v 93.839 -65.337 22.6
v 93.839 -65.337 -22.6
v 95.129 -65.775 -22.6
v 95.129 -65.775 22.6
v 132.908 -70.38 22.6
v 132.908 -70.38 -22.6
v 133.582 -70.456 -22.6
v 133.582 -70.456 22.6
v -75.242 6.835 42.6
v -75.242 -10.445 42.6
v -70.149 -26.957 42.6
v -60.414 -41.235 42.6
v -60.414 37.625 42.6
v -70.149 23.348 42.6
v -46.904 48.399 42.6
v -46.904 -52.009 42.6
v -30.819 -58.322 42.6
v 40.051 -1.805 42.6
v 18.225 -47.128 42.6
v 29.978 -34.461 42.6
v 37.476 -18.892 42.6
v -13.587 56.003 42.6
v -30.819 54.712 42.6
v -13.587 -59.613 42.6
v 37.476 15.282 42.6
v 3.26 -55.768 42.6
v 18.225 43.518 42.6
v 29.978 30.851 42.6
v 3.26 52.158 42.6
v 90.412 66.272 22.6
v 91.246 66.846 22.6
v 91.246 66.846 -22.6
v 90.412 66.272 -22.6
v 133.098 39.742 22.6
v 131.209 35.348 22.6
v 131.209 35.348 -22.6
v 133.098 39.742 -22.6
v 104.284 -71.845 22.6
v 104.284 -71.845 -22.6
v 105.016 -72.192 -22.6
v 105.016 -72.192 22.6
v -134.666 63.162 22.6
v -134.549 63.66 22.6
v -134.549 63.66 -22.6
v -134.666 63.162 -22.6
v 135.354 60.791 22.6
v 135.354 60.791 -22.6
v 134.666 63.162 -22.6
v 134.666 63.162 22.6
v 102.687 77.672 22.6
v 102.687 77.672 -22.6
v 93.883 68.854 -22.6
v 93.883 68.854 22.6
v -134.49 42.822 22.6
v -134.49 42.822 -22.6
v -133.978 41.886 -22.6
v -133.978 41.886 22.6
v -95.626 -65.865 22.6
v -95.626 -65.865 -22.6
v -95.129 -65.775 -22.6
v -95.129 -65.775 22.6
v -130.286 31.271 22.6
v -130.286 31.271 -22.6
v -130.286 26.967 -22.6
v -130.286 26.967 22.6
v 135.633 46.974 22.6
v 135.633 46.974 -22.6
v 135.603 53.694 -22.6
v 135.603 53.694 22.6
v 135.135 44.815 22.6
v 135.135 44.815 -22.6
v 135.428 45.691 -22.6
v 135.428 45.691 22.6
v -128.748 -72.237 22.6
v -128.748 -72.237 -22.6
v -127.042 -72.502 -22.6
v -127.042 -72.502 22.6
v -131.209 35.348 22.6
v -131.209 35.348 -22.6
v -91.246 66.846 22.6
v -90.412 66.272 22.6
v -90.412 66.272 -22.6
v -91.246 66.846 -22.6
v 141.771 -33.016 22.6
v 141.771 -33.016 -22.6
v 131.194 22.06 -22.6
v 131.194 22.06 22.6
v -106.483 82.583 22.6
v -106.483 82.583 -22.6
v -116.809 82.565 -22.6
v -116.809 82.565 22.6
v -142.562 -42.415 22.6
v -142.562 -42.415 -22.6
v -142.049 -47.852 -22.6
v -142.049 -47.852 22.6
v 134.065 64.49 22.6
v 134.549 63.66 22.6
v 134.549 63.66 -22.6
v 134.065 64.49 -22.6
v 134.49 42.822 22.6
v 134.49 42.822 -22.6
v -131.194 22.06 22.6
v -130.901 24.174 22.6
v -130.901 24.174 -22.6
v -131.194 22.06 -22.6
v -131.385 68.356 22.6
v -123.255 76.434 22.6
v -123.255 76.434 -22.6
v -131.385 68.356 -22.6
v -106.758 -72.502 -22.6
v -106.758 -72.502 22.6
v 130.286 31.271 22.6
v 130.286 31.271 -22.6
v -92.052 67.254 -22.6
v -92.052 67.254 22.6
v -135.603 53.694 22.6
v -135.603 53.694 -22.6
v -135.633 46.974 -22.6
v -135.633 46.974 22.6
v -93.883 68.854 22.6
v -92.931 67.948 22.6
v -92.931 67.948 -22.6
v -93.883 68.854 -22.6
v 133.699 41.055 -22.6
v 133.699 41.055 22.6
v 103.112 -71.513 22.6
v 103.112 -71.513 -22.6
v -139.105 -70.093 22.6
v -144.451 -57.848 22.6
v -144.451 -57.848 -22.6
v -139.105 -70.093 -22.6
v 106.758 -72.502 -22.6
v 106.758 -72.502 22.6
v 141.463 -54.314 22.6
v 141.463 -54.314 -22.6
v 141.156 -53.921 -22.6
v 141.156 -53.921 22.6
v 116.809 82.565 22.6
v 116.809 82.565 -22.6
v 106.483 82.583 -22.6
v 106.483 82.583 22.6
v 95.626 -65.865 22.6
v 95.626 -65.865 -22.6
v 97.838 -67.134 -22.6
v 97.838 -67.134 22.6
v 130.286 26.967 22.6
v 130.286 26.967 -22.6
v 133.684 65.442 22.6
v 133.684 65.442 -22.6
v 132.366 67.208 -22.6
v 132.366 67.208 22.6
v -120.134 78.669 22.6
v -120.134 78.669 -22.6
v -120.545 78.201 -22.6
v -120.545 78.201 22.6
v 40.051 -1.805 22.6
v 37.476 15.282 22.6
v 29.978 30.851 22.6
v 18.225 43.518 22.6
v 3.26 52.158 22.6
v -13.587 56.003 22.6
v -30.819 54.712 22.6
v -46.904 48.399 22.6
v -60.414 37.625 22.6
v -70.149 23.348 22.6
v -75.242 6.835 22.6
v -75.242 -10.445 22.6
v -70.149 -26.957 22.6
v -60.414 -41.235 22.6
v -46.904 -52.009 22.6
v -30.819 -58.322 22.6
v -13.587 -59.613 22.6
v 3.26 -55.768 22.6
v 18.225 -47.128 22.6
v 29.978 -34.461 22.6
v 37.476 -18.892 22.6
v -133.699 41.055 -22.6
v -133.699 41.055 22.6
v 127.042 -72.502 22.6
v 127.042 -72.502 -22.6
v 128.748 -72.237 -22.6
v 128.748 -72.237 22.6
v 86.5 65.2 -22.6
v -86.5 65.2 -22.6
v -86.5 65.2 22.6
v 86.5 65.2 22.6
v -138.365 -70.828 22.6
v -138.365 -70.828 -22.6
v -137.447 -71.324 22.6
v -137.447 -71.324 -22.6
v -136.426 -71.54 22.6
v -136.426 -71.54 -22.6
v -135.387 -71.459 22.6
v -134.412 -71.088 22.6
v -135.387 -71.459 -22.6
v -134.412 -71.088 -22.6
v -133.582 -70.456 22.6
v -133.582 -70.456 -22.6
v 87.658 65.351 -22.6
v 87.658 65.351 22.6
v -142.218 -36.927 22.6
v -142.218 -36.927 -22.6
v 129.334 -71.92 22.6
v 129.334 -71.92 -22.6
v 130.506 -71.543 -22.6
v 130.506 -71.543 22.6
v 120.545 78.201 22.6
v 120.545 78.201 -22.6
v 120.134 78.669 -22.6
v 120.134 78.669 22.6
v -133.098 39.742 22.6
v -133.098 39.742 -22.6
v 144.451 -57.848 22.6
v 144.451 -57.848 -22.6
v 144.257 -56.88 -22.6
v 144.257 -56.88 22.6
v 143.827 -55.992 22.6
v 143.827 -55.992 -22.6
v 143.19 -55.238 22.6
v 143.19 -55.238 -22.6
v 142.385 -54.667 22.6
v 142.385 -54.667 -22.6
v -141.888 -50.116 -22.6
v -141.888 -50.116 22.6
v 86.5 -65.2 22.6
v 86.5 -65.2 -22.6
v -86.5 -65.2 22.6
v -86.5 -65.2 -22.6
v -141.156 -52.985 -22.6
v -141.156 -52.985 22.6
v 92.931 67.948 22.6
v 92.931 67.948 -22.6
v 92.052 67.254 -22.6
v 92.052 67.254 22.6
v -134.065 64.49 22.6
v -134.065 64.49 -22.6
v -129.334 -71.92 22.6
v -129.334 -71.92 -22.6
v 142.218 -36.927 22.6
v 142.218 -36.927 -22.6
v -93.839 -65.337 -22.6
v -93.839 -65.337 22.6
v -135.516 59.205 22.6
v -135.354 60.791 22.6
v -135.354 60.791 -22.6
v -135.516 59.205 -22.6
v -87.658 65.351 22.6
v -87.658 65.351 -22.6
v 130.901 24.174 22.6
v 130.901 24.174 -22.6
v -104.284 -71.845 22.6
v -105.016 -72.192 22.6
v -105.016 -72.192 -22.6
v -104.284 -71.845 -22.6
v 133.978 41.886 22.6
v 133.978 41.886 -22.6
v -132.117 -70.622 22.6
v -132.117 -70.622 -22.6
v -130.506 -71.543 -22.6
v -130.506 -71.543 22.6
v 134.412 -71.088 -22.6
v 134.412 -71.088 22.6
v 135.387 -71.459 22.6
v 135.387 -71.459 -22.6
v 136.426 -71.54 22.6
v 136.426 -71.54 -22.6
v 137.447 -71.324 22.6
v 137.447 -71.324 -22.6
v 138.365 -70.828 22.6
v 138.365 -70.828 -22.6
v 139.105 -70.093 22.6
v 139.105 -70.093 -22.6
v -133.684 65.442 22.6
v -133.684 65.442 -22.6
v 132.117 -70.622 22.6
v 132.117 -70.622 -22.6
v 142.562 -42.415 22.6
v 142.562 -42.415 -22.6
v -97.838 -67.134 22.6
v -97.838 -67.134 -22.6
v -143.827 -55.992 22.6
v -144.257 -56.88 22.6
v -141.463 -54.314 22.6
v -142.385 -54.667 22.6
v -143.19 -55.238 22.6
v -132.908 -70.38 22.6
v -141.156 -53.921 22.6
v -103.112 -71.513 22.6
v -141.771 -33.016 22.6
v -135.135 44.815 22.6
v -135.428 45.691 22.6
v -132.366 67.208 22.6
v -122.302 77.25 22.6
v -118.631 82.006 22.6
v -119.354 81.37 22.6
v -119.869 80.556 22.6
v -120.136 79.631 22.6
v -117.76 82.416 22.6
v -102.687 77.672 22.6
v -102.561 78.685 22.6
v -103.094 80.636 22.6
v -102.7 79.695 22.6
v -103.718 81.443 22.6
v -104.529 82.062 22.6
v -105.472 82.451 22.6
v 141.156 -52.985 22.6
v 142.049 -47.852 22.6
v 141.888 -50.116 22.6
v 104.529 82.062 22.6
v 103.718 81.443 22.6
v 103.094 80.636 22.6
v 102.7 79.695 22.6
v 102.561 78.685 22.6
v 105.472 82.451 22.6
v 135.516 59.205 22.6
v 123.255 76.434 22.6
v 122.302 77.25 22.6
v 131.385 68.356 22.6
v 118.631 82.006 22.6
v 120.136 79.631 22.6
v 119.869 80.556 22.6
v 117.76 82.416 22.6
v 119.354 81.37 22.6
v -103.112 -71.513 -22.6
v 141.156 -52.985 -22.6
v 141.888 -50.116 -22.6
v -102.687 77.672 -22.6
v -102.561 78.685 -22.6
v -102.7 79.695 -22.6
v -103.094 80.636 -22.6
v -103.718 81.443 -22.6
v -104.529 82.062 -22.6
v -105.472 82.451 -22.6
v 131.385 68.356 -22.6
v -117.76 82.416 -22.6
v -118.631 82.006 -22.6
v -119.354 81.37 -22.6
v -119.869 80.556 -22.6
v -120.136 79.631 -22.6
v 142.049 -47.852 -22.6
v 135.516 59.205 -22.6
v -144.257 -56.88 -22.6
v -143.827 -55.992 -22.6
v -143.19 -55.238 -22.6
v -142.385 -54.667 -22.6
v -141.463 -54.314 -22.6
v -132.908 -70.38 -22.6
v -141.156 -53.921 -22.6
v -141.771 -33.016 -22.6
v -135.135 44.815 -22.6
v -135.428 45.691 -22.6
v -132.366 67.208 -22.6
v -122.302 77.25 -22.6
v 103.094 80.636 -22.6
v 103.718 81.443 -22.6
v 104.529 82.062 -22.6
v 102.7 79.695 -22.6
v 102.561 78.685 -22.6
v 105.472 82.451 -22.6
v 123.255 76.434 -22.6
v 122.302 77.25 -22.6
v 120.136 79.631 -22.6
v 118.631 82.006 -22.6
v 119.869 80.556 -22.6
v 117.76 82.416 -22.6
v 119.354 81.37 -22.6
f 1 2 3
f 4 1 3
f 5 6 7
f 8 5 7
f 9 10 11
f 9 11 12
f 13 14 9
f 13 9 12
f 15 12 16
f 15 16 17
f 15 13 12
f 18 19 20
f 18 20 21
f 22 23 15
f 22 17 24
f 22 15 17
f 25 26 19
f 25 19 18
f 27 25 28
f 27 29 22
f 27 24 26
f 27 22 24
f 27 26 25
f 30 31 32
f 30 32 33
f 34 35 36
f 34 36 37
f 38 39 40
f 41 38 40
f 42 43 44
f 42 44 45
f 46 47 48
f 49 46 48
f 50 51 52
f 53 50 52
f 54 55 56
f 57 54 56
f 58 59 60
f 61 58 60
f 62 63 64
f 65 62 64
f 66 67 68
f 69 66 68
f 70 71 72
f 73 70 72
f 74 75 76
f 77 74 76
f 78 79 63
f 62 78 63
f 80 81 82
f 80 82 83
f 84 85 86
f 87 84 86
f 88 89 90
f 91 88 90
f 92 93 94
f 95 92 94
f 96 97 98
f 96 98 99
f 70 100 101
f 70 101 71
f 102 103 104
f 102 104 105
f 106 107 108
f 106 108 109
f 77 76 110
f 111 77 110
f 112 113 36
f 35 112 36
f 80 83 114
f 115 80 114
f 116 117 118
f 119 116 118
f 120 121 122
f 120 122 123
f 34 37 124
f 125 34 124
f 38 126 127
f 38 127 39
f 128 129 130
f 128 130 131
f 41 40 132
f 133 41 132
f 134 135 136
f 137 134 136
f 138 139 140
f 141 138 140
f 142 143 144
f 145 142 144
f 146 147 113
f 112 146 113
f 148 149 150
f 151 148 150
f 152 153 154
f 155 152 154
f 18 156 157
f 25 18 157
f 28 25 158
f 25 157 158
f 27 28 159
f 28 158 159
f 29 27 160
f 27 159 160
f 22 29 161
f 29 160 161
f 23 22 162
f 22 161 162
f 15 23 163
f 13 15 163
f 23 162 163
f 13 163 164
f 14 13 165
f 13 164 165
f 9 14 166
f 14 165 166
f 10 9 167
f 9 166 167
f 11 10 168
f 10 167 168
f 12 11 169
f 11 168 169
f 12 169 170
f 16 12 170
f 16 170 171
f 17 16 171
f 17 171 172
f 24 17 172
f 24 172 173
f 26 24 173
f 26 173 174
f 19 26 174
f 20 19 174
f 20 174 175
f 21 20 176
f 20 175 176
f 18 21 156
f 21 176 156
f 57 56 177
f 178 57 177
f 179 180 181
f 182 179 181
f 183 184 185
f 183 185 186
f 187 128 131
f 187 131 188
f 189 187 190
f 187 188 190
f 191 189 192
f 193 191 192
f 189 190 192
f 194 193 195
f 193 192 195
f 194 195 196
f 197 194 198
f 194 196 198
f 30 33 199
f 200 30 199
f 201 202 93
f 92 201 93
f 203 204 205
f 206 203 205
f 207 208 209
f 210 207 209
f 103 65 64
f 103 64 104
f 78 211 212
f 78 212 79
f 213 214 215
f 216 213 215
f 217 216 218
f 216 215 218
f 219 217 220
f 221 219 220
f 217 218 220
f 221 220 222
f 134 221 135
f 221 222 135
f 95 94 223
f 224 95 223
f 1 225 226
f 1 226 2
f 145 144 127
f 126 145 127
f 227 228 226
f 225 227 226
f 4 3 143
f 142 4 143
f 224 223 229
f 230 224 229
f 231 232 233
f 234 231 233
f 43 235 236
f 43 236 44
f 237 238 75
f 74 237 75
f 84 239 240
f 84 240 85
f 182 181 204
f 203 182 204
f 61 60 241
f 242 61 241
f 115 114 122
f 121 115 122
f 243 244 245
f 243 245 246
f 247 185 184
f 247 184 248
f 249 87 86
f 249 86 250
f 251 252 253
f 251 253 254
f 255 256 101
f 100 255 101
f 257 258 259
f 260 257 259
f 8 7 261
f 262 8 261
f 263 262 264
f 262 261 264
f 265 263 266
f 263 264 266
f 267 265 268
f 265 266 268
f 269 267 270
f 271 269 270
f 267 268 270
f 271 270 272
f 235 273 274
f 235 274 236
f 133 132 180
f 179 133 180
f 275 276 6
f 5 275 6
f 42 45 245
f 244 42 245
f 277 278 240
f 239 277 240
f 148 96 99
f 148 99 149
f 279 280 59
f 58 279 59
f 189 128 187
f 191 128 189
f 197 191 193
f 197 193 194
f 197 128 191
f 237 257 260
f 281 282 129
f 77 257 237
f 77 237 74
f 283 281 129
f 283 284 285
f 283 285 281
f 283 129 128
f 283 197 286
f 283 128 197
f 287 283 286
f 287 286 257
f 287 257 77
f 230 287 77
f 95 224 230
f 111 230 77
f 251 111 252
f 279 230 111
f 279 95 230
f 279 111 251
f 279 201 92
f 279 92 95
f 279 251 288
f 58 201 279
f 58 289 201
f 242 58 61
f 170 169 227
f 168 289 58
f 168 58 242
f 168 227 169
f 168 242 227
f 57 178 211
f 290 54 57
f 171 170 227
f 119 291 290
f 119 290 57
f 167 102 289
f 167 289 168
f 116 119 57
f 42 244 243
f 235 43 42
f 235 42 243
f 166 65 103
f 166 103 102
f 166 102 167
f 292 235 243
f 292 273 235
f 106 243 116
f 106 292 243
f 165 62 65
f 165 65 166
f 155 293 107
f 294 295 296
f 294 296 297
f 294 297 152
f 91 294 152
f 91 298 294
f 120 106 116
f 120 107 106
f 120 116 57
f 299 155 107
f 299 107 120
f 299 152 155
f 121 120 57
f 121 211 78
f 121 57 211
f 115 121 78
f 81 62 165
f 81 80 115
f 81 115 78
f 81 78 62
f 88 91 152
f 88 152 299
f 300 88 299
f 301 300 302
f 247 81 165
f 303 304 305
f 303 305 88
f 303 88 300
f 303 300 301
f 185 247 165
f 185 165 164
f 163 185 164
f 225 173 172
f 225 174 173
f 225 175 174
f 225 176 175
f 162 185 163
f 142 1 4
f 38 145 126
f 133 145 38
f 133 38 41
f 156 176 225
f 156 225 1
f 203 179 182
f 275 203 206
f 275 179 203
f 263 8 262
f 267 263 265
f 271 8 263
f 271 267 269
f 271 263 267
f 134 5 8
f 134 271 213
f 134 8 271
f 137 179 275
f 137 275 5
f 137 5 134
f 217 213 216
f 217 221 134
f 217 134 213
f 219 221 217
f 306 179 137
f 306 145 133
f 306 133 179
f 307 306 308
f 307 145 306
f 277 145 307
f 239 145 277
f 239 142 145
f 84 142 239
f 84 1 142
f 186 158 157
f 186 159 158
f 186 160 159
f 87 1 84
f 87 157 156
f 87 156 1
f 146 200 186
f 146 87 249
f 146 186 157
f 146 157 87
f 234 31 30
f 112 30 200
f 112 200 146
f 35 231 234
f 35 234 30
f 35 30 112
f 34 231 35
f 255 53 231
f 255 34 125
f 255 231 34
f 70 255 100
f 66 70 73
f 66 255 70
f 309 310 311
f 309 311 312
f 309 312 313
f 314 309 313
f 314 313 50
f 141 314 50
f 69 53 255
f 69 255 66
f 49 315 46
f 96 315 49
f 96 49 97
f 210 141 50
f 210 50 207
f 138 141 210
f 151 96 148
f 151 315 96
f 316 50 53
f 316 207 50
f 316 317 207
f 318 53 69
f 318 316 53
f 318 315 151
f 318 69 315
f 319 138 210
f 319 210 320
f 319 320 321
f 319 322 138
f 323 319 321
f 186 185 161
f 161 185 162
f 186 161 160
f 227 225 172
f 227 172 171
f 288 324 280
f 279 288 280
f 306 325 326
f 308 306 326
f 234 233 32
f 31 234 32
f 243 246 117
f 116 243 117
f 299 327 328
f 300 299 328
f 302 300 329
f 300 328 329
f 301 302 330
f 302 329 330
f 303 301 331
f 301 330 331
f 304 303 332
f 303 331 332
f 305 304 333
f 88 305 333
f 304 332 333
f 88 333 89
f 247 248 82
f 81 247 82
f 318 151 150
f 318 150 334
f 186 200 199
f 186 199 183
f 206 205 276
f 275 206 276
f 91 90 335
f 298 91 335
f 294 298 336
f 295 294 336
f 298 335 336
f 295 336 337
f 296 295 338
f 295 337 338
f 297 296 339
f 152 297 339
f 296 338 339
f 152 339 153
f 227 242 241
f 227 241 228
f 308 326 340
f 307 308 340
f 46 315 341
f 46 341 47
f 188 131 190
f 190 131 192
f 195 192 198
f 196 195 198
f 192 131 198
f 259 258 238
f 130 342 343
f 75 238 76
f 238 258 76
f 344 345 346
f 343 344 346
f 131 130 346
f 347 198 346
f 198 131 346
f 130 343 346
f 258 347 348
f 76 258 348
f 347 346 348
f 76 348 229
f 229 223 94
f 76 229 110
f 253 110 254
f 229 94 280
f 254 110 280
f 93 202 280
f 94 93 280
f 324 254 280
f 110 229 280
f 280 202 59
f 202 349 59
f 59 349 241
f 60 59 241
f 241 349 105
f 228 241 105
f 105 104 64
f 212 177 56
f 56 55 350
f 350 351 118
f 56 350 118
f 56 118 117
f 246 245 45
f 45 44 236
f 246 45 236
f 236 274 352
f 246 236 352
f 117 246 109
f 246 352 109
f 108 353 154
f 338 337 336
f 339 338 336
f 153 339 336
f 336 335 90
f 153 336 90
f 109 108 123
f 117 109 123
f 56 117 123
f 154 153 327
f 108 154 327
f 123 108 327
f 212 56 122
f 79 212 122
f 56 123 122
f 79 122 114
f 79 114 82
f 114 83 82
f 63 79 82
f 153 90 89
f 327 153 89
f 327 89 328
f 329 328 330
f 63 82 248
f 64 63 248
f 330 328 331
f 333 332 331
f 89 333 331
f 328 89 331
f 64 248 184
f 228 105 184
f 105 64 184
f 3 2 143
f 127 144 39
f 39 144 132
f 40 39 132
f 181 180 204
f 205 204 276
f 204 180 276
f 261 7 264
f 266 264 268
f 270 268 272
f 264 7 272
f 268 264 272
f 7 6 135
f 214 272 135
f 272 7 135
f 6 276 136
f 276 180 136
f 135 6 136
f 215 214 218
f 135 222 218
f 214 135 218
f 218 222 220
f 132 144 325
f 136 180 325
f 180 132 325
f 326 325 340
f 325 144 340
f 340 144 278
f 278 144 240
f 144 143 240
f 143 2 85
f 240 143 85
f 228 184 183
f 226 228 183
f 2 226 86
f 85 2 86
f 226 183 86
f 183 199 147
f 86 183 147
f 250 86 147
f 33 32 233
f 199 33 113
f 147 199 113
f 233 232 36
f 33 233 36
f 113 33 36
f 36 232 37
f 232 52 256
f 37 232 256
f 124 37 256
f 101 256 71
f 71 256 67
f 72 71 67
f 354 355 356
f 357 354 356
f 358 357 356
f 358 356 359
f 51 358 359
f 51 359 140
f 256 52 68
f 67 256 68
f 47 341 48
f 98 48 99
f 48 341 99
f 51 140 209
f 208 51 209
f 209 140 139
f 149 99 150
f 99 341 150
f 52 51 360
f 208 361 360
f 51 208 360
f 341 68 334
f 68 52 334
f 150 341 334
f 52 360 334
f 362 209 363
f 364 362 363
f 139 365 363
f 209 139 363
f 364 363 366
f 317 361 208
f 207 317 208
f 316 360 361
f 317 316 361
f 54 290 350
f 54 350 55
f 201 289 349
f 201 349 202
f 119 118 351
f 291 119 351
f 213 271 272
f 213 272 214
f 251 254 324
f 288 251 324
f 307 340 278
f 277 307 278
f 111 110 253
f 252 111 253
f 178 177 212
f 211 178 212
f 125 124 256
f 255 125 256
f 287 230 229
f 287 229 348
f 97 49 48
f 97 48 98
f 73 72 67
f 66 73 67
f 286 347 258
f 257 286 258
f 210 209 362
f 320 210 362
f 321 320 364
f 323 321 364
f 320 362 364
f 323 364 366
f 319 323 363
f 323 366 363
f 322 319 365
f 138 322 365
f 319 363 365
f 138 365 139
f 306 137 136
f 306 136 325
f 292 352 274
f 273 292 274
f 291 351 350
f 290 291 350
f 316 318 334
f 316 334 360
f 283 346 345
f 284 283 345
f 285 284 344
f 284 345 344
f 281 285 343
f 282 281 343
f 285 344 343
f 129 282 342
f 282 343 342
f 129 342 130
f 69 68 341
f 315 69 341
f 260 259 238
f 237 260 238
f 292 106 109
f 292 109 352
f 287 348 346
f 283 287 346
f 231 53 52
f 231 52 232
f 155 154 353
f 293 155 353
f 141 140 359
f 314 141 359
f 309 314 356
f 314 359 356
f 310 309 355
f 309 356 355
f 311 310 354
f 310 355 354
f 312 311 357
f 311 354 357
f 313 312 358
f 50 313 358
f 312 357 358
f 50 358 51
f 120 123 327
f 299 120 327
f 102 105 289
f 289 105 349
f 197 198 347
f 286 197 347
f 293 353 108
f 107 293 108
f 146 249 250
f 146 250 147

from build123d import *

# Parameters (mm, degrees)
ESBO_O2_W                = 173
ESBO_O2_H                = 45.2
RESSALTO_EXTRUS_O2_DEPTH = 65.2
ESBO_O3_R                = 57.970457698
RESSALTO_EXTRUS_O3_DEPTH = 20
RESSALTO_EXTRUS_O4_START = -45.2
RESSALTO_EXTRUS_O4_DEPTH = 45.2


# Read off the part's stored shape, not the designer's step: Ressalto-extrusão4
with BuildPart() as part:
    # Esboço2 → Ressalto-extrusão2 (new, symmetric)
    with BuildSketch(Plane(origin=(0, 0, 0), x_dir=(1, 0, 0), z_dir=(0, 1, 0))):
        Rectangle(ESBO_O2_W, ESBO_O2_H)
    extrude(amount=RESSALTO_EXTRUS_O2_DEPTH, both=True)

    # Esboço3 → Ressalto-extrusão3 (add)
    with BuildSketch(Plane.XY.offset(22.6)):
        with Locations((-17.919078136, -1.804884681)):
            Circle(ESBO_O3_R)
    extrude(amount=RESSALTO_EXTRUS_O3_DEPTH)

    # Ressalto-extrusão4 outline → Ressalto-extrusão4 (add)
    with BuildSketch(Plane.XY.offset(22.6).offset(RESSALTO_EXTRUS_O4_START)):
        with BuildLine():
            Line((102.68744208, 77.672367144), (93.883087158, 68.853831482))
            Line((93.883087158, 68.853831482), (92.930908203, 67.948153687))
            Line((92.930908203, 67.948153687), (92.052246094, 67.253565979))
            Line((92.052246094, 67.253565979), (91.246276855, 66.845568848))
            Line((91.246276855, 66.845568848), (90.411560059, 66.271777344))
            Line((90.411560059, 66.271777344), (87.657562256, 65.351000977))
            Line((87.657562256, 65.351000977), (86.5, 65.2))
            Line((86.5, 65.2), (86.5, -65.2))
            Line((86.5, -65.2), (93.839447021, -65.336684036))
            Line((93.839447021, -65.336684036), (95.128540039, -65.774876404))
            Line((95.128540039, -65.774876404), (95.626312256, -65.865172195))
            Line((95.626312256, -65.865172195), (97.838317871, -67.1335495))
            Line((97.838317871, -67.1335495), (103.111968994, -71.512766647))
            Line((103.111968994, -71.512766647), (104.284179687, -71.844658661))
            Line((104.284179687, -71.844658661), (105.016326904, -72.192253876))
            Line((105.016326904, -72.192253876), (106.758210561, -72.501532079))
            Line((106.758210561, -72.501532079), (127.042376704, -72.501532079))
            Line((127.042376704, -72.501532079), (128.748016357, -72.237250137))
            Line((128.748016357, -72.237250137), (129.333953857, -71.920157242))
            Line((129.333953857, -71.920157242), (130.505584717, -71.542965698))
            Line((130.505584717, -71.542965698), (132.116973877, -70.621580887))
            Line((132.116973877, -70.621580887), (132.908325195, -70.379986572))
            Line((132.908325195, -70.379986572), (133.581878662, -70.455786514))
            ThreePointArc((133.581878662, -70.455786514), (136.426489502, -71.540170383), (139.104858398, -70.09309082))
            Line((139.104858398, -70.09309082), (144.451446533, -57.847529221))
            ThreePointArc((144.451446533, -57.847529221), (143.532086949, -55.594745414), (141.463348389, -54.313895035))
            Line((141.463348389, -54.313895035), (141.155700684, -53.921302605))
            Line((141.155700684, -53.921302605), (141.155700684, -52.985422897))
            Line((141.155700684, -52.985422897), (141.8878479, -50.116176057))
            Line((141.8878479, -50.116176057), (142.04901123, -47.851521599))
            Line((142.04901123, -47.851521599), (142.561706543, -42.41532402))
            Line((142.561706543, -42.41532402), (142.217758179, -36.926730919))
            Line((142.217758179, -36.926730919), (141.770965576, -33.015906143))
            Line((141.770965576, -33.015906143), (131.194091797, 22.060099792))
            Line((131.194091797, 22.060099792), (130.901397705, 24.174060059))
            Line((130.901397705, 24.174060059), (130.286132812, 26.96738739))
            Line((130.286132812, 26.96738739), (130.286132812, 31.270747375))
            Line((130.286132812, 31.270747375), (131.20904541, 35.347880554))
            Line((131.20904541, 35.347880554), (133.098449707, 39.741893005))
            Line((133.098449707, 39.741893005), (133.699371338, 41.055262756))
            Line((133.699371338, 41.055262756), (133.97769165, 41.886050415))
            Line((133.97769165, 41.886050415), (134.49041748, 42.821932983))
            Line((134.49041748, 42.821932983), (135.134979248, 44.815394592))
            Line((135.134979248, 44.815394592), (135.427642822, 45.69118042))
            Line((135.427642822, 45.69118042), (135.632751465, 46.974353027))
            Line((135.632751465, 46.974353027), (135.60345459, 53.694026184))
            Line((135.60345459, 53.694026184), (135.515838623, 59.205119324))
            Line((135.515838623, 59.205119324), (135.354400635, 60.790583801))
            Line((135.354400635, 60.790583801), (134.665893555, 63.161540222))
            Line((134.665893555, 63.161540222), (134.54901123, 63.659831238))
            Line((134.54901123, 63.659831238), (134.065307617, 64.490313721))
            Line((134.065307617, 64.490313721), (133.684417725, 65.441600037))
            Line((133.684417725, 65.441600037), (132.36630249, 67.208262634))
            Line((132.36630249, 67.208262634), (131.38482666, 68.355540466))
            Line((131.38482666, 68.355540466), (123.254638672, 76.434184265))
            Line((123.254638672, 76.434184265), (122.302154541, 77.249568176))
            Line((122.302154541, 77.249568176), (120.544555664, 78.200854492))
            Line((120.544555664, 78.200854492), (120.134399414, 78.668643188))
            ThreePointArc((120.134399414, 78.668643188), (119.353688391, 81.369611441), (116.808776855, 82.5646698))
            Line((116.808776855, 82.5646698), (106.483274703, 82.583373499))
            ThreePointArc((106.483274703, 82.583373499), (103.379795658, 81.059678188), (102.68744208, 77.672367144))
        make_face()
        with BuildLine():
            Line((-128.748016357, -72.237250137), (-127.042376704, -72.501532079))
            Line((-127.042376704, -72.501532079), (-106.758210561, -72.501532079))
            Line((-106.758210561, -72.501532079), (-105.016326904, -72.192253876))
            Line((-105.016326904, -72.192253876), (-104.284179688, -71.844658661))
            Line((-104.284179688, -71.844658661), (-103.111968994, -71.512766647))
            Line((-103.111968994, -71.512766647), (-97.838317871, -67.1335495))
            Line((-97.838317871, -67.1335495), (-95.626312256, -65.865172195))
            Line((-95.626312256, -65.865172195), (-95.128540039, -65.774876404))
            Line((-95.128540039, -65.774876404), (-93.839447021, -65.336684036))
            Line((-93.839447021, -65.336684036), (-86.5, -65.2))
            Line((-86.5, -65.2), (-86.5, 65.2))
            Line((-86.5, 65.2), (-87.657562256, 65.351000977))
            Line((-87.657562256, 65.351000977), (-90.411560059, 66.271777344))
            Line((-90.411560059, 66.271777344), (-91.246276855, 66.845568848))
            Line((-91.246276855, 66.845568848), (-92.052246094, 67.253565979))
            Line((-92.052246094, 67.253565979), (-92.930908203, 67.948153687))
            Line((-92.930908203, 67.948153687), (-93.883087158, 68.853831482))
            Line((-93.883087158, 68.853831482), (-102.68744208, 77.672367144))
            ThreePointArc((-102.68744208, 77.672367144), (-103.379795658, 81.059678188), (-106.483274703, 82.583373499))
            Line((-106.483274703, 82.583373499), (-116.808776855, 82.5646698))
            ThreePointArc((-116.808776855, 82.5646698), (-119.353688391, 81.369611441), (-120.134399414, 78.668643188))
            Line((-120.134399414, 78.668643188), (-120.544555664, 78.200854492))
            Line((-120.544555664, 78.200854492), (-122.302154541, 77.249568176))
            Line((-122.302154541, 77.249568176), (-123.254638672, 76.434184265))
            Line((-123.254638672, 76.434184265), (-131.38482666, 68.355540466))
            Line((-131.38482666, 68.355540466), (-132.36630249, 67.208262634))
            Line((-132.36630249, 67.208262634), (-133.684417725, 65.441600037))
            Line((-133.684417725, 65.441600037), (-134.065307617, 64.490313721))
            Line((-134.065307617, 64.490313721), (-134.54901123, 63.659831238))
            Line((-134.54901123, 63.659831238), (-134.665893555, 63.161540222))
            Line((-134.665893555, 63.161540222), (-135.354400635, 60.790583801))
            Line((-135.354400635, 60.790583801), (-135.515838623, 59.205119324))
            Line((-135.515838623, 59.205119324), (-135.60345459, 53.694026184))
            Line((-135.60345459, 53.694026184), (-135.632751465, 46.974353027))
            Line((-135.632751465, 46.974353027), (-135.427642822, 45.69118042))
            Line((-135.427642822, 45.69118042), (-135.134979248, 44.815394592))
            Line((-135.134979248, 44.815394592), (-134.49041748, 42.821932983))
            Line((-134.49041748, 42.821932983), (-133.97769165, 41.886050415))
            Line((-133.97769165, 41.886050415), (-133.699371338, 41.055262756))
            Line((-133.699371338, 41.055262756), (-133.098449707, 39.741893005))
            Line((-133.098449707, 39.741893005), (-131.20904541, 35.347880554))
            Line((-131.20904541, 35.347880554), (-130.286132813, 31.270747375))
            Line((-130.286132813, 31.270747375), (-130.286132812, 26.96738739))
            Line((-130.286132812, 26.96738739), (-130.901397705, 24.174060059))
            Line((-130.901397705, 24.174060059), (-131.194091797, 22.060099792))
            Line((-131.194091797, 22.060099792), (-141.770965576, -33.015906143))
            Line((-141.770965576, -33.015906143), (-142.217758179, -36.926730919))
            Line((-142.217758179, -36.926730919), (-142.561706543, -42.41532402))
            Line((-142.561706543, -42.41532402), (-142.04901123, -47.851521599))
            Line((-142.04901123, -47.851521599), (-141.8878479, -50.116176057))
            Line((-141.8878479, -50.116176057), (-141.155700684, -52.985422897))
            Line((-141.155700684, -52.985422897), (-141.155700684, -53.921302605))
            Line((-141.155700684, -53.921302605), (-141.463348389, -54.313895035))
            ThreePointArc((-141.463348389, -54.313895035), (-143.532086949, -55.594745414), (-144.451446533, -57.847529221))
            Line((-144.451446533, -57.847529221), (-139.104858398, -70.09309082))
            ThreePointArc((-139.104858398, -70.09309082), (-136.426489502, -71.540170383), (-133.581878662, -70.455786514))
            Line((-133.581878662, -70.455786514), (-132.908325195, -70.379986572))
            Line((-132.908325195, -70.379986572), (-132.116973877, -70.621580887))
            Line((-132.116973877, -70.621580887), (-130.505584717, -71.542965698))
            Line((-130.505584717, -71.542965698), (-129.333953857, -71.920157242))
            Line((-129.333953857, -71.920157242), (-128.748016357, -72.237250137))
        make_face()
    extrude(amount=RESSALTO_EXTRUS_O4_DEPTH)


solid = part.part
